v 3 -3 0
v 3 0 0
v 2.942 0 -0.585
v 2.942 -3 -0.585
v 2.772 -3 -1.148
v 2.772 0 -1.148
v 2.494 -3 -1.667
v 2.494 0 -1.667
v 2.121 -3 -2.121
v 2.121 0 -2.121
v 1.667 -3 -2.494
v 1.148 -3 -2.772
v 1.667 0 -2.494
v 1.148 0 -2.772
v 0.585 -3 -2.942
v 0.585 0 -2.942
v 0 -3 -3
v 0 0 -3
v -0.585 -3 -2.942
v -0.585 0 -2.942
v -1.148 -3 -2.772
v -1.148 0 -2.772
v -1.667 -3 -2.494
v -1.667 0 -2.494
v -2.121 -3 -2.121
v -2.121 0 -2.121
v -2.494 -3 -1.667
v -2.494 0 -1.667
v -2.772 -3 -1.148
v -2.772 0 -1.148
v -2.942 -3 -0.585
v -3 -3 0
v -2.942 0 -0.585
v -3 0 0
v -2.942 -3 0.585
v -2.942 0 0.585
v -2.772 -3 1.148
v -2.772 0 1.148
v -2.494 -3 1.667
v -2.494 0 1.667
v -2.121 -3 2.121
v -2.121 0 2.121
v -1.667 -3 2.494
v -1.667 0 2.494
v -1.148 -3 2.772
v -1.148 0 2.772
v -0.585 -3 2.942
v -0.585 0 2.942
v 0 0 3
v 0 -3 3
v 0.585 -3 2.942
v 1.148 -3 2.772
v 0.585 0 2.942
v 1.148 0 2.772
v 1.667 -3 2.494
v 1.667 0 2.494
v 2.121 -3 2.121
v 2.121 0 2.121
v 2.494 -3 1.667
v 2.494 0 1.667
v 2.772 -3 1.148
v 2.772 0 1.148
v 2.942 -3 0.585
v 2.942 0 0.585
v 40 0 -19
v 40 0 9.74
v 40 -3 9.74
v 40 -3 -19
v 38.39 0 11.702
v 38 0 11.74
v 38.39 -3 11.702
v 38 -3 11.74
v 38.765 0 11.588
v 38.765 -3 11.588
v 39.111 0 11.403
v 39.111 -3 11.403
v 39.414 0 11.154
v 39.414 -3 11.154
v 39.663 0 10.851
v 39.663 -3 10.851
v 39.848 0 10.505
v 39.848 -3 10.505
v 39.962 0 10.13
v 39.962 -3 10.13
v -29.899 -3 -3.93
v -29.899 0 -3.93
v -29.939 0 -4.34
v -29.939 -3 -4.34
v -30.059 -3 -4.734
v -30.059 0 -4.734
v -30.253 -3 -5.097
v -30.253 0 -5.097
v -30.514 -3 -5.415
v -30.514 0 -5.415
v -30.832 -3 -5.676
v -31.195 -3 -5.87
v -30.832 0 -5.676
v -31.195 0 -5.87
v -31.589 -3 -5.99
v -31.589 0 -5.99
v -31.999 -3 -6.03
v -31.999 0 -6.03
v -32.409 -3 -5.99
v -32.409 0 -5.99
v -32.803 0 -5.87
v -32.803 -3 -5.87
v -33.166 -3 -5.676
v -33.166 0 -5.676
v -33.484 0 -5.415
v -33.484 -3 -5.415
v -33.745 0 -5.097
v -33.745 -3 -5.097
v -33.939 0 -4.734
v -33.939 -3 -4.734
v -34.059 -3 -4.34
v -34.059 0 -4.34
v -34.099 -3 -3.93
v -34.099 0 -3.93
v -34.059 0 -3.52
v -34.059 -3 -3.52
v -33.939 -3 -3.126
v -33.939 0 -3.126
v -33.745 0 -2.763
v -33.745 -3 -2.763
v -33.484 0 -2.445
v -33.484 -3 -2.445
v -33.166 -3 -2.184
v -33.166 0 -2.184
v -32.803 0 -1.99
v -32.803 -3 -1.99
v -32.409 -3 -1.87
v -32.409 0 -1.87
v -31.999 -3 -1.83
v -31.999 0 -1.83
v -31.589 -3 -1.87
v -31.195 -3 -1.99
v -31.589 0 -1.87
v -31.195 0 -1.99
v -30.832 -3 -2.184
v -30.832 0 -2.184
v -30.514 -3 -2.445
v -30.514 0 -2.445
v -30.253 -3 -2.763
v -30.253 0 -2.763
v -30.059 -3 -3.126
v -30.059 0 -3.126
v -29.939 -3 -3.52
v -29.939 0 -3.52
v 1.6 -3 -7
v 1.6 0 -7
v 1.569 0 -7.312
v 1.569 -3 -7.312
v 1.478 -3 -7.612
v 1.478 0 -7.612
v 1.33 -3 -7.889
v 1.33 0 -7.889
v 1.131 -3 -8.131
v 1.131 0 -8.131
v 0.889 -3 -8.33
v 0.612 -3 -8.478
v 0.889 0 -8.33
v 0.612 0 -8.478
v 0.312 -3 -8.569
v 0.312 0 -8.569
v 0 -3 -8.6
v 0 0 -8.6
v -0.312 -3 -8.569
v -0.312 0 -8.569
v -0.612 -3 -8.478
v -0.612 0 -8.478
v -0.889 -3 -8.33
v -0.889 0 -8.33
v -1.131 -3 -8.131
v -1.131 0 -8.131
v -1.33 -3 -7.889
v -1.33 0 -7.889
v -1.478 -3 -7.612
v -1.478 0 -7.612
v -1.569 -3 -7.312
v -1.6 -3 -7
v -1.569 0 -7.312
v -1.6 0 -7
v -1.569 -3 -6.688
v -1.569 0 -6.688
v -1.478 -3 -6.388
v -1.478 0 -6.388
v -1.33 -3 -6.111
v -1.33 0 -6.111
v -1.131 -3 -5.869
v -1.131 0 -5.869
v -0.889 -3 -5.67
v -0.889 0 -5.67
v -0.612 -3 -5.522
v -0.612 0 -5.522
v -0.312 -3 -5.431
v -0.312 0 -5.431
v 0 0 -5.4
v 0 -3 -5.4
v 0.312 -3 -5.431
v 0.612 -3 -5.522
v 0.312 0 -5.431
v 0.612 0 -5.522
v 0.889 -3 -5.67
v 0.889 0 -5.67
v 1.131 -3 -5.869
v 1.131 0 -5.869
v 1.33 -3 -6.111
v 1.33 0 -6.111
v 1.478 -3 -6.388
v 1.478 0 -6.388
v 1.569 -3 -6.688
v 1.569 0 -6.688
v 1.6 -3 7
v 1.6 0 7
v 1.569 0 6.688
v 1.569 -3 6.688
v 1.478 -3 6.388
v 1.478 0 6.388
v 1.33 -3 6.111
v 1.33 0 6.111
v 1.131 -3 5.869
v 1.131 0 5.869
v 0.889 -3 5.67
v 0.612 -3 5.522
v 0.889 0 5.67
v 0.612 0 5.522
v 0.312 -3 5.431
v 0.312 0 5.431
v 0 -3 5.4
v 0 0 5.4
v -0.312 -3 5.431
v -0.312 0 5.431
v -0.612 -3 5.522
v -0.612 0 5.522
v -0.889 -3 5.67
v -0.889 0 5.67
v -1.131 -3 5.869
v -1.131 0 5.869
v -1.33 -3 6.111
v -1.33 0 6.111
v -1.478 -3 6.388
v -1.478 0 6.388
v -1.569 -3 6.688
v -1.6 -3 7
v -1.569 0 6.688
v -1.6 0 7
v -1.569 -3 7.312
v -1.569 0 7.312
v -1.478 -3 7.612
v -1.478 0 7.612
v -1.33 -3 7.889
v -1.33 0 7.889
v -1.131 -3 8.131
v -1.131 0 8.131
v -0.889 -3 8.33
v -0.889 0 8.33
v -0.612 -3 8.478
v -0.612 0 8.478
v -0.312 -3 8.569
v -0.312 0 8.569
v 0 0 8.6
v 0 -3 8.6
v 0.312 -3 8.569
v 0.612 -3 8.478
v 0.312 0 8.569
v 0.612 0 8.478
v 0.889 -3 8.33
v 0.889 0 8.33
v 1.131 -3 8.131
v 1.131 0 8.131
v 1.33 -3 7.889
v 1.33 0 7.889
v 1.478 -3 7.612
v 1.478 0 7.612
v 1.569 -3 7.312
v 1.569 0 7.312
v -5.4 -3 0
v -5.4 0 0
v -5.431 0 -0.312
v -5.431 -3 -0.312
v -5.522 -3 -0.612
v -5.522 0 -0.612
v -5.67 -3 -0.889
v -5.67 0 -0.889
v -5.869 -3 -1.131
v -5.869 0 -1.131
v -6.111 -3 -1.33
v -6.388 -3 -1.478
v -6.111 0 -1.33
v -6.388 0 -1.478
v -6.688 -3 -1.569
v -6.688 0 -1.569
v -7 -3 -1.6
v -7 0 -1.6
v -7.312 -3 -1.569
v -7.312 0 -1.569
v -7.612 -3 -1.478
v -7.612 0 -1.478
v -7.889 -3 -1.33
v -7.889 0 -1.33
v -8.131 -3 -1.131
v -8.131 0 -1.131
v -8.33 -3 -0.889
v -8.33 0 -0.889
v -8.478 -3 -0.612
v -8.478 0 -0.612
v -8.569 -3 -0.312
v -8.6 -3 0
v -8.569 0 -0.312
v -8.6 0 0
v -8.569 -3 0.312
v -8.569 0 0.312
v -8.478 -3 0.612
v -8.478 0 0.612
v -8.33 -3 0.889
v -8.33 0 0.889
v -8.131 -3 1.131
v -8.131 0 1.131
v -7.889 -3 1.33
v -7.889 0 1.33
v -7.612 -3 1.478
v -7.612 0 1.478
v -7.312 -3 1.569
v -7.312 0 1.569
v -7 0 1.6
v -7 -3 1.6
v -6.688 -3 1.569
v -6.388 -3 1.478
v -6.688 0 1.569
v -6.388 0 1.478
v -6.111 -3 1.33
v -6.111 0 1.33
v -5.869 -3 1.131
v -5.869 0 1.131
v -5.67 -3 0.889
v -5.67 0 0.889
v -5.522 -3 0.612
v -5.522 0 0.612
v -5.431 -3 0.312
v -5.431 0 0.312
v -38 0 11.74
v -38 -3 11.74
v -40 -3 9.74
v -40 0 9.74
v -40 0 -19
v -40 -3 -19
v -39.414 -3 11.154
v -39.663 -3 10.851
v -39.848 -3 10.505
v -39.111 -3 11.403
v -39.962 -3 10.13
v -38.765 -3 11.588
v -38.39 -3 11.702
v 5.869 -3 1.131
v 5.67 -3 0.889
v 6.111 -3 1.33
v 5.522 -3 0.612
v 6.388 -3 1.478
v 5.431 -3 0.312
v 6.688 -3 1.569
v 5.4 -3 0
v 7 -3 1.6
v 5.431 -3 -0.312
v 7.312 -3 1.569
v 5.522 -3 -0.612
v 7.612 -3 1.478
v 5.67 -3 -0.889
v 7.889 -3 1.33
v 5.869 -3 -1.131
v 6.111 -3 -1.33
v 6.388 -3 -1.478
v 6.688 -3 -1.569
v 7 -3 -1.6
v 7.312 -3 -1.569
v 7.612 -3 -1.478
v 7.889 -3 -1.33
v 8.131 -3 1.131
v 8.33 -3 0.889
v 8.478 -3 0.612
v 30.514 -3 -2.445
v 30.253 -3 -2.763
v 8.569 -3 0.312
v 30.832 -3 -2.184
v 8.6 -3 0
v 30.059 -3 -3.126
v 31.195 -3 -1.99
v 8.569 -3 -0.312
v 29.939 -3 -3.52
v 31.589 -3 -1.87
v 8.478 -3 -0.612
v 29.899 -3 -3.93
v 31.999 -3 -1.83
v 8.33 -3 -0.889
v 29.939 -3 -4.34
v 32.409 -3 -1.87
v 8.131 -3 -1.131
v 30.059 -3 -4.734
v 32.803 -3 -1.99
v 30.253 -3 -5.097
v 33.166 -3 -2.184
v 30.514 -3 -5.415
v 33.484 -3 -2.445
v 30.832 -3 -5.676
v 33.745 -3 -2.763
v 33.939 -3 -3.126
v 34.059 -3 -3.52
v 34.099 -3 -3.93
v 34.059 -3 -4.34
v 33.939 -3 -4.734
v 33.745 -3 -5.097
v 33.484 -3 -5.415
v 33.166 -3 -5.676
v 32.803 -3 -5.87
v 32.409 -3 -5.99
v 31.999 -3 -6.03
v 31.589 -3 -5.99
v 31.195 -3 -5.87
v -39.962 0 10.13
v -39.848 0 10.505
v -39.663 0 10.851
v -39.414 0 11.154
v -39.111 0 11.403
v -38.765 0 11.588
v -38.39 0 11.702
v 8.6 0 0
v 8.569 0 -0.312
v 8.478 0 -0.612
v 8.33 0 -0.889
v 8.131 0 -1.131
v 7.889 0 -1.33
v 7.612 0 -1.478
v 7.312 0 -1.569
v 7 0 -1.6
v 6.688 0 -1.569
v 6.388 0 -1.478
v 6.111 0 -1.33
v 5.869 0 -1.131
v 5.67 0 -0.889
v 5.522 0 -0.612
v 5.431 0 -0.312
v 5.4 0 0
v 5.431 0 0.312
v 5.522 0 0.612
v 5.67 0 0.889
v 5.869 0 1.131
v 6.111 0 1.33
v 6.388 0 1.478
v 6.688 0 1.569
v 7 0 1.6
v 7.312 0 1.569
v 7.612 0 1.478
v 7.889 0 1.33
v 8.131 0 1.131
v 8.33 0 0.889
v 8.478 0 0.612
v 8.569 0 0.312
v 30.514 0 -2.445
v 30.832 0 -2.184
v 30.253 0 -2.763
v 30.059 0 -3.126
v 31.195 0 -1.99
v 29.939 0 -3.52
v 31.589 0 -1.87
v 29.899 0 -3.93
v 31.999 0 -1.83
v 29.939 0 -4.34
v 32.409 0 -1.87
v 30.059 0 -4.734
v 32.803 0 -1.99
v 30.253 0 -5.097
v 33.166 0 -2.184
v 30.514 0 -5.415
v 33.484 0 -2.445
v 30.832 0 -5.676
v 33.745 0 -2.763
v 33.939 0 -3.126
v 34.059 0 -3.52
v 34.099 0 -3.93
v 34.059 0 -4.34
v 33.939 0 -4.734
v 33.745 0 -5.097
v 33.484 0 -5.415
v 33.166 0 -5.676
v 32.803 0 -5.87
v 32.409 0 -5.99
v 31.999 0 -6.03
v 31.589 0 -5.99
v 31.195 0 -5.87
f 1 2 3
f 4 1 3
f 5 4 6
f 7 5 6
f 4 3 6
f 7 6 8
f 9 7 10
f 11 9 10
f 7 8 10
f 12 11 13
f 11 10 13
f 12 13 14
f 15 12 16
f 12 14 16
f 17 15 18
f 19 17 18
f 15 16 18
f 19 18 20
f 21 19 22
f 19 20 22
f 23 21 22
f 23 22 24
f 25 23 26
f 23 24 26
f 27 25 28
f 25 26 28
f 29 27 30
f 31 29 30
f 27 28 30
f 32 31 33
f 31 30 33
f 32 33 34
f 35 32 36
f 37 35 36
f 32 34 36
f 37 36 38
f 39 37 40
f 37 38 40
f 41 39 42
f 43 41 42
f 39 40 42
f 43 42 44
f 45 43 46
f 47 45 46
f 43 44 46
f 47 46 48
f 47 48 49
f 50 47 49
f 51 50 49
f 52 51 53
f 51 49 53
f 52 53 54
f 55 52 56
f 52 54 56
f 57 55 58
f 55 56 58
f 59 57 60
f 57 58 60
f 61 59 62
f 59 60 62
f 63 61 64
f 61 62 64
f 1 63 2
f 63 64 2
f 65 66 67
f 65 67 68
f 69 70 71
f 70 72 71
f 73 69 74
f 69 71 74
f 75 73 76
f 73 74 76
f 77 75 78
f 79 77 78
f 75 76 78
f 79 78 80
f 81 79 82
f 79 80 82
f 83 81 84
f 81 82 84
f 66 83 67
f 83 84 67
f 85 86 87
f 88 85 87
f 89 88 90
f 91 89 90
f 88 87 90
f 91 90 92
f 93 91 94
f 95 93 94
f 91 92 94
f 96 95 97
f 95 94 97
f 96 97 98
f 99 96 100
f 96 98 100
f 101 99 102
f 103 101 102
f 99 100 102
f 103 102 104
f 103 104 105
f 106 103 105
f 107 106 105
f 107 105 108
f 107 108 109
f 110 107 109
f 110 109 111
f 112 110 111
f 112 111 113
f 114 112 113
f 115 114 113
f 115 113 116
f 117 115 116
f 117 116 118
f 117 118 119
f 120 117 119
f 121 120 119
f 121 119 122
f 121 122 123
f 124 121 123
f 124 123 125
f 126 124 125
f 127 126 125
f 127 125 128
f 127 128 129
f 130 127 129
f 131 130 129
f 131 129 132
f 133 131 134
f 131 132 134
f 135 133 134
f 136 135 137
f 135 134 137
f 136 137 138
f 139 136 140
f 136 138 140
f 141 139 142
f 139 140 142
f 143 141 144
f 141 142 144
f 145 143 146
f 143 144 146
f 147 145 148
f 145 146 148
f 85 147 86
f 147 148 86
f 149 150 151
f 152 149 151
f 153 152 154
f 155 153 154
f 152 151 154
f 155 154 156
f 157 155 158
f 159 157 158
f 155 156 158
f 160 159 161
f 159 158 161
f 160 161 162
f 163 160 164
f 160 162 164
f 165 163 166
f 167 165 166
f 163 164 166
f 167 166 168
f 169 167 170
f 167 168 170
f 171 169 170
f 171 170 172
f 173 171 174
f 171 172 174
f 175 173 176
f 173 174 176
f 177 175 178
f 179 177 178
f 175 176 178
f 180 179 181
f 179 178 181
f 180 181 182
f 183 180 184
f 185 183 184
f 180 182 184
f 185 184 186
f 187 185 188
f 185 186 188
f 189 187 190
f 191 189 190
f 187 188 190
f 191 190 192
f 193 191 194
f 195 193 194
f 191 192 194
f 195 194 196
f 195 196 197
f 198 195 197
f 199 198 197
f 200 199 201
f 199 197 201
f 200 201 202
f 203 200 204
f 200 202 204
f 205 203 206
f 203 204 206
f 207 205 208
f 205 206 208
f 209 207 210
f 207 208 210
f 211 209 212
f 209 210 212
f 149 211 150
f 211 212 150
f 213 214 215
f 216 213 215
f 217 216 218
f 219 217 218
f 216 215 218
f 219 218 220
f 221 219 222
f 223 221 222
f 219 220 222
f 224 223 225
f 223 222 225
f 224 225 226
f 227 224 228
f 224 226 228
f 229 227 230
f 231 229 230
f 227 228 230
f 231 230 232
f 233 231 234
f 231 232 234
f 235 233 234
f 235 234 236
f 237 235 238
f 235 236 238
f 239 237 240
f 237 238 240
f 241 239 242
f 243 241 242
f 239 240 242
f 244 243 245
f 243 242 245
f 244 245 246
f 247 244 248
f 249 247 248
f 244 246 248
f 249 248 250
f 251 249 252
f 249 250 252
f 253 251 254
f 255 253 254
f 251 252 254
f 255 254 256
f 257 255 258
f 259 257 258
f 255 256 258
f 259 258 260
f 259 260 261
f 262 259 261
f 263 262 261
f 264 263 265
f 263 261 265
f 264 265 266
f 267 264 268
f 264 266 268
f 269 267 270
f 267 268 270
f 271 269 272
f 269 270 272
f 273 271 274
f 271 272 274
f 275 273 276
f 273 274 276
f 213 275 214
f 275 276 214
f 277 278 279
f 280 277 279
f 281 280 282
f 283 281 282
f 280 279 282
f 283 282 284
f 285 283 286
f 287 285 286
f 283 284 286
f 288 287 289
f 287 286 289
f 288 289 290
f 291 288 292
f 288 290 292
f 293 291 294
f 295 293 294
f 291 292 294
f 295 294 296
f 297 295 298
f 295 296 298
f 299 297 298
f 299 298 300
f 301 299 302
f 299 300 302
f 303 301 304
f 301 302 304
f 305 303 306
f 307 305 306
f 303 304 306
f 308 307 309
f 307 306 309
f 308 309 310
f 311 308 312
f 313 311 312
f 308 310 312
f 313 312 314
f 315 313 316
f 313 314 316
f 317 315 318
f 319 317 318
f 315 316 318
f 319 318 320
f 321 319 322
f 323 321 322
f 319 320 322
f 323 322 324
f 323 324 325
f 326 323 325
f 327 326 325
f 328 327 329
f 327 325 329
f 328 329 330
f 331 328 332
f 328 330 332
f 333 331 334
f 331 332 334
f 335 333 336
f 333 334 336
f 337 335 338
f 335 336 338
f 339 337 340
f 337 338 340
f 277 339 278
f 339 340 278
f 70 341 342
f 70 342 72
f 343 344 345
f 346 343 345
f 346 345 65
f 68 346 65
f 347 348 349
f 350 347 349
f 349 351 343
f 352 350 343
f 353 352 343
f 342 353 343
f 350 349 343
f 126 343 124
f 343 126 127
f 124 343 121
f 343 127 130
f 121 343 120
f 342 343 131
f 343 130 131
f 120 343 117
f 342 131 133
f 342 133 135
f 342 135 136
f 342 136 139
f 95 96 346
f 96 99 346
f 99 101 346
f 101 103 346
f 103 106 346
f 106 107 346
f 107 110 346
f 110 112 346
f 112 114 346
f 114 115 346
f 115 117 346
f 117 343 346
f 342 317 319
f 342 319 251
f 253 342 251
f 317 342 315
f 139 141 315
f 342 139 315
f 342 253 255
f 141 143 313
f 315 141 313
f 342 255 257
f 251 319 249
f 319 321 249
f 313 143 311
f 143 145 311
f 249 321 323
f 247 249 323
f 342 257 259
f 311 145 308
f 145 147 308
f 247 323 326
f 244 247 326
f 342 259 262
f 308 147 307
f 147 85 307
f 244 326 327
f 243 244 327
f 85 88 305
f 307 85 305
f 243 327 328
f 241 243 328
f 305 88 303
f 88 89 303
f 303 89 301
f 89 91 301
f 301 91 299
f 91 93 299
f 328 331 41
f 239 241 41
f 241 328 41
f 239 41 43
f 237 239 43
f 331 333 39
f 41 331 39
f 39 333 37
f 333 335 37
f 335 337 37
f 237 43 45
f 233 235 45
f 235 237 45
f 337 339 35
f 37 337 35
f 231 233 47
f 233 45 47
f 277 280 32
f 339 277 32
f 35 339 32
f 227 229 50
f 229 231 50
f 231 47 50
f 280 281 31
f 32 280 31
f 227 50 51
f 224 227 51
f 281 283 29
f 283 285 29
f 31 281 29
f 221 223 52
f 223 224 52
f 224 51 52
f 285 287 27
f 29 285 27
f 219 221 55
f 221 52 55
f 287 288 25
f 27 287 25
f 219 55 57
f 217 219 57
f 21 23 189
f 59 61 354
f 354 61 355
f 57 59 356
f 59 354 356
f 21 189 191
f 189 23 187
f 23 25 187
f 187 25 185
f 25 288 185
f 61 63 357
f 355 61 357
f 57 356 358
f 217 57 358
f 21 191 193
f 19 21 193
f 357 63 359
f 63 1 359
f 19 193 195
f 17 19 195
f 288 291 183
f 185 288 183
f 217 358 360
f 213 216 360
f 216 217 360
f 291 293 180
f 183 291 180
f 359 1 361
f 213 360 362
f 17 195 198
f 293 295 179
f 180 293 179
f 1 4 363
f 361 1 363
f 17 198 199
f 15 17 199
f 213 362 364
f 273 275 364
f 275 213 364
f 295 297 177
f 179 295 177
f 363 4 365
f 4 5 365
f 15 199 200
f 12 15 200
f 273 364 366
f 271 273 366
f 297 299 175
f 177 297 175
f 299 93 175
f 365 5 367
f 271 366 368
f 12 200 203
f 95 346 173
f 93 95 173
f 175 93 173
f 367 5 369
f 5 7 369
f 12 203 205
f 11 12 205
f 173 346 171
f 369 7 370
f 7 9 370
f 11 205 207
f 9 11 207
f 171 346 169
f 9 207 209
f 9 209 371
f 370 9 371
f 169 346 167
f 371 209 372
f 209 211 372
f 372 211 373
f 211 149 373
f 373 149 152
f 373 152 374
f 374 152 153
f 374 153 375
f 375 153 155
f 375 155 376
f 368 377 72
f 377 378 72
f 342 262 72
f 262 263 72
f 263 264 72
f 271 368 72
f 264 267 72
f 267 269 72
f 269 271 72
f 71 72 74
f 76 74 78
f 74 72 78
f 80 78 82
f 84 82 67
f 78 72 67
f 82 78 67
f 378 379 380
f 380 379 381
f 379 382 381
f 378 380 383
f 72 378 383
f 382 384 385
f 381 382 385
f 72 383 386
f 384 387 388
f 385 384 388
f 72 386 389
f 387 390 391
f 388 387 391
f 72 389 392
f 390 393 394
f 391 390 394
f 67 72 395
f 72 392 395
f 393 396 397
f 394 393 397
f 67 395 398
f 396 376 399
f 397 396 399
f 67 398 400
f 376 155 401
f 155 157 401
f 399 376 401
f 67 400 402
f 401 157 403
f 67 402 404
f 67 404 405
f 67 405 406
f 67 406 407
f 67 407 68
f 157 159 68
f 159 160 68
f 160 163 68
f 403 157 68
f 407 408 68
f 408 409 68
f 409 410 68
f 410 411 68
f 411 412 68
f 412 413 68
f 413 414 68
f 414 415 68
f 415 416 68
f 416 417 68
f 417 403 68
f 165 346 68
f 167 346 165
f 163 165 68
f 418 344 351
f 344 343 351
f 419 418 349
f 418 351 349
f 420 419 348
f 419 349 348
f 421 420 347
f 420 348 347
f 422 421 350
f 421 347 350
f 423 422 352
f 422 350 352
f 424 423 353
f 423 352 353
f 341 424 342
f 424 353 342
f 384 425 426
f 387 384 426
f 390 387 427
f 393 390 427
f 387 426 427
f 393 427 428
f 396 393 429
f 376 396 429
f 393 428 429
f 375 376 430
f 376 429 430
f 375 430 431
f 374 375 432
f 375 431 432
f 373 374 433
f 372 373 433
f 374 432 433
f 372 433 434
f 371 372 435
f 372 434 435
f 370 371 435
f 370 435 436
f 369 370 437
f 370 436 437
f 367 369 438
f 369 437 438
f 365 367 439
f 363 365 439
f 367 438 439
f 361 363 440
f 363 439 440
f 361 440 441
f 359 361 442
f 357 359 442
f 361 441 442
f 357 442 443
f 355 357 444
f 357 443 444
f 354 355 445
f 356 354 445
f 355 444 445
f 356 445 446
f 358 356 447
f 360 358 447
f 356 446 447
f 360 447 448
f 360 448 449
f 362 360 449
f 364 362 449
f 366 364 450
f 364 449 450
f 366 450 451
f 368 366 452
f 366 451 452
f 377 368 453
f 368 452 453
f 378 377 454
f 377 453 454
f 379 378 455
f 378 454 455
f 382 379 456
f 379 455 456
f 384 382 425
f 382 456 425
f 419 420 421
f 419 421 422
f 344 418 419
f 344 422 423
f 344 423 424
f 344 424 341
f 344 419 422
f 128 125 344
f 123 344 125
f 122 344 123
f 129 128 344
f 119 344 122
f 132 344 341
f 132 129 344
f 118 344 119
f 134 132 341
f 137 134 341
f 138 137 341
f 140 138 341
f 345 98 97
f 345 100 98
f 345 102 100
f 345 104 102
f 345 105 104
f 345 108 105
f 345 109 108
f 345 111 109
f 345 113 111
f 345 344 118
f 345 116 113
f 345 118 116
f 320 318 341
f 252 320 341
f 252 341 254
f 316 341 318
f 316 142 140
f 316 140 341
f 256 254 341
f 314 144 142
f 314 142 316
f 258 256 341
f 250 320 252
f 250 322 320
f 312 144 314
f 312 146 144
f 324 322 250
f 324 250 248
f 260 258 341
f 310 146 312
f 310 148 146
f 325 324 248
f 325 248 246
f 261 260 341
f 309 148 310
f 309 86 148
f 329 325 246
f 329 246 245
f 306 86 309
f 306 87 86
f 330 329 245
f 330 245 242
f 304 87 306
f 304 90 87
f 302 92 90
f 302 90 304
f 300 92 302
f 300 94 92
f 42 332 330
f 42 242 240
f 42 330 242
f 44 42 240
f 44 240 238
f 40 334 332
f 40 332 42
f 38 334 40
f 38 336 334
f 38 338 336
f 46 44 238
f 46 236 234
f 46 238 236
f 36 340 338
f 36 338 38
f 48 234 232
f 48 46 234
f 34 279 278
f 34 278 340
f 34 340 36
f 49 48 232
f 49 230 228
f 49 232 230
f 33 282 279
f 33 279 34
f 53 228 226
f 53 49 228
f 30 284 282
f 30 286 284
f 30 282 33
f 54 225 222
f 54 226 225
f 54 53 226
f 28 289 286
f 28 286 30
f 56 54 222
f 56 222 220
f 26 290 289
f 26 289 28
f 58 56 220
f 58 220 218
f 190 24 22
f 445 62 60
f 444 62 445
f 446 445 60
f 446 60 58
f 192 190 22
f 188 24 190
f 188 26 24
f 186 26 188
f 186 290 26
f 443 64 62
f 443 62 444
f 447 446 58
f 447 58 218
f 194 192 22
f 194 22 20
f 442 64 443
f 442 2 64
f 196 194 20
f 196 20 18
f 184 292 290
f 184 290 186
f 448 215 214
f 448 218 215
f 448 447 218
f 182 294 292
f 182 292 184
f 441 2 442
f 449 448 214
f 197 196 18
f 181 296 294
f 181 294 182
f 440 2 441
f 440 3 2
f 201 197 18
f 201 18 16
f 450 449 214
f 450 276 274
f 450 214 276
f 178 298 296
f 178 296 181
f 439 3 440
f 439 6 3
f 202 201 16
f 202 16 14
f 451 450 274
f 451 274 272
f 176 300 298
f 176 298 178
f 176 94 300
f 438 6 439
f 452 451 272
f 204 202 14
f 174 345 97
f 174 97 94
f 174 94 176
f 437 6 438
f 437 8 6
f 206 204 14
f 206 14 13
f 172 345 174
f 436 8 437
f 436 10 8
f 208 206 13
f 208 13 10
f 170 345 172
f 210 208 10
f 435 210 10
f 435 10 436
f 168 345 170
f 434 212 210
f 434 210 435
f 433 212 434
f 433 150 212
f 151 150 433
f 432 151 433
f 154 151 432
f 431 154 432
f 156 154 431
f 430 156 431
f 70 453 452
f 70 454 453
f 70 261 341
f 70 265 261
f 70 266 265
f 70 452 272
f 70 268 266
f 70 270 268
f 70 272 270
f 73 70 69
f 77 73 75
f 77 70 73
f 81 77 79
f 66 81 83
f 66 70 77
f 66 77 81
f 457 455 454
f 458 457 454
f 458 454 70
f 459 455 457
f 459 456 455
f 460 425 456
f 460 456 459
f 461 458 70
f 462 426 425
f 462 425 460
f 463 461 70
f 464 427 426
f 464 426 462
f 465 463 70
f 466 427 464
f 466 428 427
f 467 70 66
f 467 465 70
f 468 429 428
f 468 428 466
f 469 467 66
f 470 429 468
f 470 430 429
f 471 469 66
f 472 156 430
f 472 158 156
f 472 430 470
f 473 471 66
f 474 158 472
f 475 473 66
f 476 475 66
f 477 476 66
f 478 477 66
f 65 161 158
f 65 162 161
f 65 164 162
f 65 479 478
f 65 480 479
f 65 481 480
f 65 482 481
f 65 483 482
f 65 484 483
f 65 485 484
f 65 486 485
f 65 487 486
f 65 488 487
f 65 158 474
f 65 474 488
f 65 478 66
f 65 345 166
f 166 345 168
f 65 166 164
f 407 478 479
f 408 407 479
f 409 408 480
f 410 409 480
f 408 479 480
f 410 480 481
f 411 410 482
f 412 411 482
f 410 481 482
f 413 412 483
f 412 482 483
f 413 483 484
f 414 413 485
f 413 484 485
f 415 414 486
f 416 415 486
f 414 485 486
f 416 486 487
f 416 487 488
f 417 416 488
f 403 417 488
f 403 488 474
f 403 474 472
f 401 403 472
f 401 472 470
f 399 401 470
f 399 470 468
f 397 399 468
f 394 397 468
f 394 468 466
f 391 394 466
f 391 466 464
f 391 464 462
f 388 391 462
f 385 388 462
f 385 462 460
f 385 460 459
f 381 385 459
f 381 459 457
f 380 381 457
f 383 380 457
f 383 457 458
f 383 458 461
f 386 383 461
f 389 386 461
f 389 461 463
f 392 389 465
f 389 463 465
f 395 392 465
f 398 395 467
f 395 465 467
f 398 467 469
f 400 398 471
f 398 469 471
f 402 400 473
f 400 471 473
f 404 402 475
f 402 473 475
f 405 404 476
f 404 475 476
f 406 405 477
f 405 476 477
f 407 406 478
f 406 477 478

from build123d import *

# Parameters (mm, degrees)
SKETCH1_W           = 80
SKETCH1_H           = 30.74
SKETCH1_R           = 3
SKETCH1_R_2         = 1.6
BOSS_EXTRUDE1_DEPTH = 3
SKETCH2_R           = 2.1
CUT_EXTRUDE1_DEPTH  = 10
FILLET1_R           = 2


with BuildPart() as part:
    # Sketch1 → Boss-Extrude1 (new body)
    with BuildSketch(Plane(origin=(0, 0, 0), x_dir=(1, 0, 0), z_dir=(0, 1, 0))):
        with Locations((0, 3.63)):
            Rectangle(SKETCH1_W, SKETCH1_H)
        Circle(SKETCH1_R, mode=Mode.SUBTRACT)
        with Locations((0, 7)):
            Circle(SKETCH1_R_2, mode=Mode.SUBTRACT)
        with Locations((-7, 0)):
            Circle(SKETCH1_R_2, mode=Mode.SUBTRACT)
        with Locations((0, -7)):
            Circle(SKETCH1_R_2, mode=Mode.SUBTRACT)
        with Locations((7, 0)):
            Circle(SKETCH1_R_2, mode=Mode.SUBTRACT)
    extrude(amount=-BOSS_EXTRUDE1_DEPTH)

    # Sketch2 → Cut-Extrude1 (cut)
    with BuildSketch(Plane(origin=(0, 0, 0), x_dir=(1, 0, 0), z_dir=(0, 1, 0))):
        with Locations((31.999, 3.93)):
            Circle(SKETCH2_R)
        with Locations((-31.999, 3.93)):
            Circle(SKETCH2_R)
    extrude(amount=-CUT_EXTRUDE1_DEPTH, mode=Mode.SUBTRACT)

    # Fillet1
    fillet1_edges = [part.edges().sort_by_distance(p)[0] for p in [
        (40, -1.5, 11.74),
        (-40, -1.5, 11.74),
    ]]
    fillet(fillet1_edges, radius=FILLET1_R)


solid = part.part
